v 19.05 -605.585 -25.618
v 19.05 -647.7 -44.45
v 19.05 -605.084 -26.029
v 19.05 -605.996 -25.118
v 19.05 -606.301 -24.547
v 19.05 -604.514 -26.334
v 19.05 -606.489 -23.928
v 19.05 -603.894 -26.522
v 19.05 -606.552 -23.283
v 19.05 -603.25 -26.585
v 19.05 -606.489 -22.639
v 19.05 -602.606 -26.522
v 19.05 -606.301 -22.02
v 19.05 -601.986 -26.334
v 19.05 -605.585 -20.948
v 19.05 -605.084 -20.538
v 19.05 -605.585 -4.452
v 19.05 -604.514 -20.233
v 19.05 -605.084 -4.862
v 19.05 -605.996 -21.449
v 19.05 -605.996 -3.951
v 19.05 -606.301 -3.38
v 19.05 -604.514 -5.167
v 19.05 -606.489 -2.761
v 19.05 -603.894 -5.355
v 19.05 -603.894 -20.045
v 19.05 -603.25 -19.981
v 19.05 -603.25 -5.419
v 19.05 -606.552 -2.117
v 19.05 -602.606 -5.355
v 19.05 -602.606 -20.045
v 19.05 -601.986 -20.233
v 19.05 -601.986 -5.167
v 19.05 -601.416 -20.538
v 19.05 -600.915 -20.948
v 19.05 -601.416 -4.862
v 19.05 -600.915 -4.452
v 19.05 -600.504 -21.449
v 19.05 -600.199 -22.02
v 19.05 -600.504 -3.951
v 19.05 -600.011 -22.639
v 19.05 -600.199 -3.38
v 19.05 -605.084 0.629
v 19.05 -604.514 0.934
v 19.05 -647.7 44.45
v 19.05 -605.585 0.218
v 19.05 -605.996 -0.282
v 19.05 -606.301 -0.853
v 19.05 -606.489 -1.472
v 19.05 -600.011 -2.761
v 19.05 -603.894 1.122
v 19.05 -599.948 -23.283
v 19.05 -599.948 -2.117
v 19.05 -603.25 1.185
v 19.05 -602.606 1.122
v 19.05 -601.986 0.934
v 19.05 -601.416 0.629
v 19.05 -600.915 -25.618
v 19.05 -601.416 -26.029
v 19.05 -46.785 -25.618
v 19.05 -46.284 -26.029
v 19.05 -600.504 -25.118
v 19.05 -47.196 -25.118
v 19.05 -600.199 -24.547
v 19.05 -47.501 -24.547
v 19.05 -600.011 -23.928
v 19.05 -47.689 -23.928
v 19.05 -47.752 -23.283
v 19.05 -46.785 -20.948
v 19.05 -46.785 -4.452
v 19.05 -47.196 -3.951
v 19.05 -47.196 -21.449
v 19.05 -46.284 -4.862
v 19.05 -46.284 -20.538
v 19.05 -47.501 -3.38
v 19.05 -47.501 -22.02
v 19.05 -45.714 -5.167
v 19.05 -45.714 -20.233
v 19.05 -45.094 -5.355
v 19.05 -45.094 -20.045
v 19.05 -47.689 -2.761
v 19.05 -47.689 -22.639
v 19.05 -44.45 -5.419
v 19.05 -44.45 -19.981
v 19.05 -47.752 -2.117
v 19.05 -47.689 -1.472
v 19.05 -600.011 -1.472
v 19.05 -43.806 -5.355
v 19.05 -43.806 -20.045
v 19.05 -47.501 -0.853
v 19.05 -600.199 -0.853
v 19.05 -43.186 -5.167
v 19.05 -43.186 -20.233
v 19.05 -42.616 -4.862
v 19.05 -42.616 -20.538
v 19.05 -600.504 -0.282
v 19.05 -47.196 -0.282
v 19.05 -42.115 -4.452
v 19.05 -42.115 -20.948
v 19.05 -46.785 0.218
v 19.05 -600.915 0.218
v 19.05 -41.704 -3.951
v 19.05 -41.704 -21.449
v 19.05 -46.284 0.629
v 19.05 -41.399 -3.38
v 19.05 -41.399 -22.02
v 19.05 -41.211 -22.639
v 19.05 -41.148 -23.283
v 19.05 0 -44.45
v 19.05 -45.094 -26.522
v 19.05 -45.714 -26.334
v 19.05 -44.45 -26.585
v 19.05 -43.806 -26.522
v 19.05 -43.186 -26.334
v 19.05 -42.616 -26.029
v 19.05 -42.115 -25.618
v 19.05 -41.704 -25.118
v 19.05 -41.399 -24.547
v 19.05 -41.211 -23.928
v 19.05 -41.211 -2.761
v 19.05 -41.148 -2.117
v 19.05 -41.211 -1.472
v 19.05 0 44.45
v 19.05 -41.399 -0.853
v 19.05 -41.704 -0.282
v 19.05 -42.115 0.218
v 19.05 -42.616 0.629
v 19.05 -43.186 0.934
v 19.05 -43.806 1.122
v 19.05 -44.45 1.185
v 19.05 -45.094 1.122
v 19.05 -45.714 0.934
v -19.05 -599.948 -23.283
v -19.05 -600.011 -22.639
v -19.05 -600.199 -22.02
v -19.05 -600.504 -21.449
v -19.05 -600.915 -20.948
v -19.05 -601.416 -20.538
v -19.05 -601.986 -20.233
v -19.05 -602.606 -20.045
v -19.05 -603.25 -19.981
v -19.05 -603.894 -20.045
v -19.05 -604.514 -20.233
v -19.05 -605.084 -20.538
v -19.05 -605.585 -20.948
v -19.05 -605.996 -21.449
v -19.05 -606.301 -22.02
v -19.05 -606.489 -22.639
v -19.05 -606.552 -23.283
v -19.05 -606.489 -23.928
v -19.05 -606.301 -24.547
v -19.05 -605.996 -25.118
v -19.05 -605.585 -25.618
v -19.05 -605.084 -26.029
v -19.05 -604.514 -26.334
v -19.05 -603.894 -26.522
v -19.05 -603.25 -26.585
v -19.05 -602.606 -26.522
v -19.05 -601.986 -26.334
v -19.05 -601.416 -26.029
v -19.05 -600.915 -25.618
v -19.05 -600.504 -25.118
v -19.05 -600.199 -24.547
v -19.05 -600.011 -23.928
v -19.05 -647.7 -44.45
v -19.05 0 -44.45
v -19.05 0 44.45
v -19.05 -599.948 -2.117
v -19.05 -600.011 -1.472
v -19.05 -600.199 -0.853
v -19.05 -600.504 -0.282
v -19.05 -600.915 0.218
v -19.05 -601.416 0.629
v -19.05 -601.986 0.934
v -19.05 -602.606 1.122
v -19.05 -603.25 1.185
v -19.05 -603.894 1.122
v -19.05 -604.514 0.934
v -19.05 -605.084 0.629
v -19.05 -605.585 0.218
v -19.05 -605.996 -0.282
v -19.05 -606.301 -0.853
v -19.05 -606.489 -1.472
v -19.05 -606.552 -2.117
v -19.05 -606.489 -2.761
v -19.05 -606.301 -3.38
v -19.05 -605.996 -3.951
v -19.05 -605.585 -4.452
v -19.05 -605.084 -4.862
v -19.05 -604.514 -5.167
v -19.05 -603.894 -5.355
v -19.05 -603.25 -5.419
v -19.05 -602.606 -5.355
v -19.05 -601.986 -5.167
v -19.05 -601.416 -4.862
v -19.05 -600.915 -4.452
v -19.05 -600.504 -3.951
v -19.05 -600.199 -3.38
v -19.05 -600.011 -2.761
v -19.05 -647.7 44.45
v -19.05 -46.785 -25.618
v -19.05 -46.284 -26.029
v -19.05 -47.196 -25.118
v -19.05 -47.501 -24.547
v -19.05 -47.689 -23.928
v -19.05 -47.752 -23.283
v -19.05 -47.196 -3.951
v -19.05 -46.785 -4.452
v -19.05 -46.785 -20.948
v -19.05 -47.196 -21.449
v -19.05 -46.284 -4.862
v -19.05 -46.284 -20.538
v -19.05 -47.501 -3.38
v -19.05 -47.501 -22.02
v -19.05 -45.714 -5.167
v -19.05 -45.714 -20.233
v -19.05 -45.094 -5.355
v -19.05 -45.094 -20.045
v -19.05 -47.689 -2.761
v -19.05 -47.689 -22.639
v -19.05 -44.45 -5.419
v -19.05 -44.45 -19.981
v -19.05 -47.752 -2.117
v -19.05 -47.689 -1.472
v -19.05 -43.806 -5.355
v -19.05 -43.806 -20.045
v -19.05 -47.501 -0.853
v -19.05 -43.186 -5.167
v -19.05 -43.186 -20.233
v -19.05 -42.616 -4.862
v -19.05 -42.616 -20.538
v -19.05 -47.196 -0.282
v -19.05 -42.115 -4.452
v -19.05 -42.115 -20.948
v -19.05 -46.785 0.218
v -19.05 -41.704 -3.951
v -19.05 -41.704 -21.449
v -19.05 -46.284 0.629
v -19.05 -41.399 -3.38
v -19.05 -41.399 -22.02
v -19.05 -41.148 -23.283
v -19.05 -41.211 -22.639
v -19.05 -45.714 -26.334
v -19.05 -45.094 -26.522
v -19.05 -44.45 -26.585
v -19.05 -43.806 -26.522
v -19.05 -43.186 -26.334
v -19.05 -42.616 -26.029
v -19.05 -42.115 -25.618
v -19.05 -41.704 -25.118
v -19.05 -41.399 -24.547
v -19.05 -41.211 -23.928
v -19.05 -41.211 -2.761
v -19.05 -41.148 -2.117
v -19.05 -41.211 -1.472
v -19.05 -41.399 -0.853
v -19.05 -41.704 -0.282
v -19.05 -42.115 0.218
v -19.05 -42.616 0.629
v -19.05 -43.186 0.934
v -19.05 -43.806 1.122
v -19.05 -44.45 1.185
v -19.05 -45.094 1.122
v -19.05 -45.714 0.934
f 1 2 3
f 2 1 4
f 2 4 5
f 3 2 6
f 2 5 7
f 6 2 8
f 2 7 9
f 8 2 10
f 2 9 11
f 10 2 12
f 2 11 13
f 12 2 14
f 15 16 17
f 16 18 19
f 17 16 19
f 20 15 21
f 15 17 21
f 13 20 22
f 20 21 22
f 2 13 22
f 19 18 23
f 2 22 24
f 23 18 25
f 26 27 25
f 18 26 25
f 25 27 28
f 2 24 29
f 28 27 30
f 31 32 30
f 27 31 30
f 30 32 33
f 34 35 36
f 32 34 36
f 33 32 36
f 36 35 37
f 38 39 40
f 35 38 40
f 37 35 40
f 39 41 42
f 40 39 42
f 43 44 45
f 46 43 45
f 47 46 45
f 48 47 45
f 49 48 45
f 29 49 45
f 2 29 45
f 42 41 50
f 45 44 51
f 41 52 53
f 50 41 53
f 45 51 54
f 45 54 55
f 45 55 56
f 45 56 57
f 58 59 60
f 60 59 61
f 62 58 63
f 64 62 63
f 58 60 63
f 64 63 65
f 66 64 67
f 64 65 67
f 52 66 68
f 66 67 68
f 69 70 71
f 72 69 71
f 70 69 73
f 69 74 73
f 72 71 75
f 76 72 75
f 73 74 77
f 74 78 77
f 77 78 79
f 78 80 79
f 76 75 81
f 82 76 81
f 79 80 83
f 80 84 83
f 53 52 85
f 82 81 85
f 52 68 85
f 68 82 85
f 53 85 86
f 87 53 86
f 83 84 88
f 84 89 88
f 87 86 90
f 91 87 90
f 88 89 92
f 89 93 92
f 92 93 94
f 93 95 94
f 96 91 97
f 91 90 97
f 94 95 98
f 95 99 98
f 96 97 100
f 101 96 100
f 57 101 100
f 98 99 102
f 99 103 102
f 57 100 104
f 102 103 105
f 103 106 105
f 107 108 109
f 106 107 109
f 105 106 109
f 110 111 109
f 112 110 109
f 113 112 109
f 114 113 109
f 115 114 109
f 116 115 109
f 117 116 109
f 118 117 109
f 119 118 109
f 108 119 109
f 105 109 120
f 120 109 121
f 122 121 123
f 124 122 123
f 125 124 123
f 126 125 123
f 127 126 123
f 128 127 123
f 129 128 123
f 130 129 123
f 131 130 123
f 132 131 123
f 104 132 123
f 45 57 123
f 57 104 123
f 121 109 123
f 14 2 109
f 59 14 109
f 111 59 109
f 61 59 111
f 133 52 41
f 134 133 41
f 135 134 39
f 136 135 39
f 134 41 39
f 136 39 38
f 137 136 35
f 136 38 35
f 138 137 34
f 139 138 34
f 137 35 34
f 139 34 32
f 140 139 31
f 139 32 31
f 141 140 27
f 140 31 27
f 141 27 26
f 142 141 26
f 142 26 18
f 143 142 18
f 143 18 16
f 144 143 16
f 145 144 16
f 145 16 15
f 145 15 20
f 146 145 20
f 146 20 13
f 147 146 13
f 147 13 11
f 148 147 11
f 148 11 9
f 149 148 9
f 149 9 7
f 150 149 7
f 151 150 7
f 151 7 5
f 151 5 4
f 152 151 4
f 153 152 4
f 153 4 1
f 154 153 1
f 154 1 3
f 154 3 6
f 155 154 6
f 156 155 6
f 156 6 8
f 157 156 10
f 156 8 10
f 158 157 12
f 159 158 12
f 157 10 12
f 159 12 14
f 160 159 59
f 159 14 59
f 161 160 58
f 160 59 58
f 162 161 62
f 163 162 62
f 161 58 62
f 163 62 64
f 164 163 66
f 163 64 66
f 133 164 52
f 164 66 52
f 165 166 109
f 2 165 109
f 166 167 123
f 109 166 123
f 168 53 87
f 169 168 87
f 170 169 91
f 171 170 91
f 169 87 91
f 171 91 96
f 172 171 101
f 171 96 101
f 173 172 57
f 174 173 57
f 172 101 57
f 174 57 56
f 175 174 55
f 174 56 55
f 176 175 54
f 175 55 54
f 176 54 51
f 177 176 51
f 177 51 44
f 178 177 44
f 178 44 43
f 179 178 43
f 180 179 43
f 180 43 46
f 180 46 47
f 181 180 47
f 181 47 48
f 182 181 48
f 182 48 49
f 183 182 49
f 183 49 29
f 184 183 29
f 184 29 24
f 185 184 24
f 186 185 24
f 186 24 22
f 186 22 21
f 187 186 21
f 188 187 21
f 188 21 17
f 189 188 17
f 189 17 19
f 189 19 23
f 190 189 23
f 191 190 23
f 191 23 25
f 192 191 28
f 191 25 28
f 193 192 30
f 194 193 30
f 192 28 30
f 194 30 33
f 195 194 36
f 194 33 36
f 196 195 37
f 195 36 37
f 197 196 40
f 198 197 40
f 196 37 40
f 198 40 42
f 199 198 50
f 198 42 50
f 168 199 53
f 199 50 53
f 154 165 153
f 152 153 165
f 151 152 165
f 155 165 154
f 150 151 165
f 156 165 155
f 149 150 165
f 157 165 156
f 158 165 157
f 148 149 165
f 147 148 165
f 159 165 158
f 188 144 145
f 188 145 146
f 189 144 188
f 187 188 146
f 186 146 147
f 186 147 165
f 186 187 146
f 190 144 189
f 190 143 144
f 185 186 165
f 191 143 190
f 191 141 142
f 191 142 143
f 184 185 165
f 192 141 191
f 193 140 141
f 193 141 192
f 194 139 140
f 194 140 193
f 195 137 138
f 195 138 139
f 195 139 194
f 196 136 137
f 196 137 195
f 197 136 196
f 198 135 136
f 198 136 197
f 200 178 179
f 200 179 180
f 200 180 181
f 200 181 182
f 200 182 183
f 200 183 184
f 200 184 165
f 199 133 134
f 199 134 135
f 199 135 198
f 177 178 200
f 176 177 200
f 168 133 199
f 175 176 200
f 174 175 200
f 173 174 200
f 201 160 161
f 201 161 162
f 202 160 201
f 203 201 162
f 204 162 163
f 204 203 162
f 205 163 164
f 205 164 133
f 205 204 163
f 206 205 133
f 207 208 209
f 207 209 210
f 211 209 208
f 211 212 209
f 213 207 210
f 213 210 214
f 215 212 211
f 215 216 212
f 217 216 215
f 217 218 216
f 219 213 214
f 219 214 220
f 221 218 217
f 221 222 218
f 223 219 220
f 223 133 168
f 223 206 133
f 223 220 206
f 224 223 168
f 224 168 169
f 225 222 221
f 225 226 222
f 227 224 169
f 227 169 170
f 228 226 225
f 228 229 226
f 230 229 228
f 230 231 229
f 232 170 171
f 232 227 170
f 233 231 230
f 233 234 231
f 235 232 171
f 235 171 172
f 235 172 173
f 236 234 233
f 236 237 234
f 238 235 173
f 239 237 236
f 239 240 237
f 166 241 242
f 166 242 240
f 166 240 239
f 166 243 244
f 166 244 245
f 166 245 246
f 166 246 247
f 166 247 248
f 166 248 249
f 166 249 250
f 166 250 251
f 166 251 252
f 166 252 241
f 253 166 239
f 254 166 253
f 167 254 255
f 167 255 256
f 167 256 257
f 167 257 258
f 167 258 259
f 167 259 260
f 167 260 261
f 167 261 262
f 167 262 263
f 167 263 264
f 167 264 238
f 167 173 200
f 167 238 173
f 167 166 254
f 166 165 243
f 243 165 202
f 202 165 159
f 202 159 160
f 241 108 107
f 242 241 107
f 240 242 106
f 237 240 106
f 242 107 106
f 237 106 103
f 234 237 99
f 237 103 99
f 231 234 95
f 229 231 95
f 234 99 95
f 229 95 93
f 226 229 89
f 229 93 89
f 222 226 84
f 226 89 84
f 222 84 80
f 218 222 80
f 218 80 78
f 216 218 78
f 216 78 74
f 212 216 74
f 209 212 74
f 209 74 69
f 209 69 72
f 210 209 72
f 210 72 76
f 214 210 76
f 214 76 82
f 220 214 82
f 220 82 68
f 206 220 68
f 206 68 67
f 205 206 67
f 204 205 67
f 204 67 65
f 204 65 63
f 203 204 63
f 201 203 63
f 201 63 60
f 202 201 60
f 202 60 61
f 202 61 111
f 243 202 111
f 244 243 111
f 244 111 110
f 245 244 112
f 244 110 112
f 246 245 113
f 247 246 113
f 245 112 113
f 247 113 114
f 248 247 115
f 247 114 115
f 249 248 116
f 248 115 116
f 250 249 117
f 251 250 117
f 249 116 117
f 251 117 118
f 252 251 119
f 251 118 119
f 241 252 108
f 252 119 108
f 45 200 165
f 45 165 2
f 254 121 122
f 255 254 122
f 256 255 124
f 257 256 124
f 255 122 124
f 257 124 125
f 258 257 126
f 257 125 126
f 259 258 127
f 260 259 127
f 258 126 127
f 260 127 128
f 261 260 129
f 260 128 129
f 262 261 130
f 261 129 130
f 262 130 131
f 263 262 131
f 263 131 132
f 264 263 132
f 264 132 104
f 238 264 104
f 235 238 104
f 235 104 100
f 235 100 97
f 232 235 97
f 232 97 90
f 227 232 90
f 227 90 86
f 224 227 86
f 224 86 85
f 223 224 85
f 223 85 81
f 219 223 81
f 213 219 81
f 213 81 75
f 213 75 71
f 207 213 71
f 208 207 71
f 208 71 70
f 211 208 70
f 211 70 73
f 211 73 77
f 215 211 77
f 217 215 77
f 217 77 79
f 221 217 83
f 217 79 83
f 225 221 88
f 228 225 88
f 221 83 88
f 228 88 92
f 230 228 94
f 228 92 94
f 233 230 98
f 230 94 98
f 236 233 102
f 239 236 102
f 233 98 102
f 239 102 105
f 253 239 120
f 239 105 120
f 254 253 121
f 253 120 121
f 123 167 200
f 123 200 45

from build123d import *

# Parameters (mm, degrees)
F0_W     = 38.1
F0_H     = 88.9
F1_DEPTH = 647.7
F2_R     = 3.302
F3_DEPTH = 38.101


with BuildPart() as f1:
    # F0 (on Front) → F1 (new body)
    with BuildSketch(Plane.XZ):
        Rectangle(F0_W, F0_H)
    extrude(amount=F1_DEPTH)

    # F2 (on face) → F3 (cut, through all)
    with BuildSketch(Plane.YZ.offset(19.05)):
        with Locations((-603.25, -2.116667)):
            Circle(F2_R)
        with Locations((-603.25, -23.283333)):
            Circle(F2_R)
        with Locations((-44.45, -23.283333)):
            Circle(F2_R)
        with Locations((-44.45, -2.116667)):
            Circle(F2_R)
    extrude(amount=-F3_DEPTH, mode=Mode.SUBTRACT)


solid = f1.part
